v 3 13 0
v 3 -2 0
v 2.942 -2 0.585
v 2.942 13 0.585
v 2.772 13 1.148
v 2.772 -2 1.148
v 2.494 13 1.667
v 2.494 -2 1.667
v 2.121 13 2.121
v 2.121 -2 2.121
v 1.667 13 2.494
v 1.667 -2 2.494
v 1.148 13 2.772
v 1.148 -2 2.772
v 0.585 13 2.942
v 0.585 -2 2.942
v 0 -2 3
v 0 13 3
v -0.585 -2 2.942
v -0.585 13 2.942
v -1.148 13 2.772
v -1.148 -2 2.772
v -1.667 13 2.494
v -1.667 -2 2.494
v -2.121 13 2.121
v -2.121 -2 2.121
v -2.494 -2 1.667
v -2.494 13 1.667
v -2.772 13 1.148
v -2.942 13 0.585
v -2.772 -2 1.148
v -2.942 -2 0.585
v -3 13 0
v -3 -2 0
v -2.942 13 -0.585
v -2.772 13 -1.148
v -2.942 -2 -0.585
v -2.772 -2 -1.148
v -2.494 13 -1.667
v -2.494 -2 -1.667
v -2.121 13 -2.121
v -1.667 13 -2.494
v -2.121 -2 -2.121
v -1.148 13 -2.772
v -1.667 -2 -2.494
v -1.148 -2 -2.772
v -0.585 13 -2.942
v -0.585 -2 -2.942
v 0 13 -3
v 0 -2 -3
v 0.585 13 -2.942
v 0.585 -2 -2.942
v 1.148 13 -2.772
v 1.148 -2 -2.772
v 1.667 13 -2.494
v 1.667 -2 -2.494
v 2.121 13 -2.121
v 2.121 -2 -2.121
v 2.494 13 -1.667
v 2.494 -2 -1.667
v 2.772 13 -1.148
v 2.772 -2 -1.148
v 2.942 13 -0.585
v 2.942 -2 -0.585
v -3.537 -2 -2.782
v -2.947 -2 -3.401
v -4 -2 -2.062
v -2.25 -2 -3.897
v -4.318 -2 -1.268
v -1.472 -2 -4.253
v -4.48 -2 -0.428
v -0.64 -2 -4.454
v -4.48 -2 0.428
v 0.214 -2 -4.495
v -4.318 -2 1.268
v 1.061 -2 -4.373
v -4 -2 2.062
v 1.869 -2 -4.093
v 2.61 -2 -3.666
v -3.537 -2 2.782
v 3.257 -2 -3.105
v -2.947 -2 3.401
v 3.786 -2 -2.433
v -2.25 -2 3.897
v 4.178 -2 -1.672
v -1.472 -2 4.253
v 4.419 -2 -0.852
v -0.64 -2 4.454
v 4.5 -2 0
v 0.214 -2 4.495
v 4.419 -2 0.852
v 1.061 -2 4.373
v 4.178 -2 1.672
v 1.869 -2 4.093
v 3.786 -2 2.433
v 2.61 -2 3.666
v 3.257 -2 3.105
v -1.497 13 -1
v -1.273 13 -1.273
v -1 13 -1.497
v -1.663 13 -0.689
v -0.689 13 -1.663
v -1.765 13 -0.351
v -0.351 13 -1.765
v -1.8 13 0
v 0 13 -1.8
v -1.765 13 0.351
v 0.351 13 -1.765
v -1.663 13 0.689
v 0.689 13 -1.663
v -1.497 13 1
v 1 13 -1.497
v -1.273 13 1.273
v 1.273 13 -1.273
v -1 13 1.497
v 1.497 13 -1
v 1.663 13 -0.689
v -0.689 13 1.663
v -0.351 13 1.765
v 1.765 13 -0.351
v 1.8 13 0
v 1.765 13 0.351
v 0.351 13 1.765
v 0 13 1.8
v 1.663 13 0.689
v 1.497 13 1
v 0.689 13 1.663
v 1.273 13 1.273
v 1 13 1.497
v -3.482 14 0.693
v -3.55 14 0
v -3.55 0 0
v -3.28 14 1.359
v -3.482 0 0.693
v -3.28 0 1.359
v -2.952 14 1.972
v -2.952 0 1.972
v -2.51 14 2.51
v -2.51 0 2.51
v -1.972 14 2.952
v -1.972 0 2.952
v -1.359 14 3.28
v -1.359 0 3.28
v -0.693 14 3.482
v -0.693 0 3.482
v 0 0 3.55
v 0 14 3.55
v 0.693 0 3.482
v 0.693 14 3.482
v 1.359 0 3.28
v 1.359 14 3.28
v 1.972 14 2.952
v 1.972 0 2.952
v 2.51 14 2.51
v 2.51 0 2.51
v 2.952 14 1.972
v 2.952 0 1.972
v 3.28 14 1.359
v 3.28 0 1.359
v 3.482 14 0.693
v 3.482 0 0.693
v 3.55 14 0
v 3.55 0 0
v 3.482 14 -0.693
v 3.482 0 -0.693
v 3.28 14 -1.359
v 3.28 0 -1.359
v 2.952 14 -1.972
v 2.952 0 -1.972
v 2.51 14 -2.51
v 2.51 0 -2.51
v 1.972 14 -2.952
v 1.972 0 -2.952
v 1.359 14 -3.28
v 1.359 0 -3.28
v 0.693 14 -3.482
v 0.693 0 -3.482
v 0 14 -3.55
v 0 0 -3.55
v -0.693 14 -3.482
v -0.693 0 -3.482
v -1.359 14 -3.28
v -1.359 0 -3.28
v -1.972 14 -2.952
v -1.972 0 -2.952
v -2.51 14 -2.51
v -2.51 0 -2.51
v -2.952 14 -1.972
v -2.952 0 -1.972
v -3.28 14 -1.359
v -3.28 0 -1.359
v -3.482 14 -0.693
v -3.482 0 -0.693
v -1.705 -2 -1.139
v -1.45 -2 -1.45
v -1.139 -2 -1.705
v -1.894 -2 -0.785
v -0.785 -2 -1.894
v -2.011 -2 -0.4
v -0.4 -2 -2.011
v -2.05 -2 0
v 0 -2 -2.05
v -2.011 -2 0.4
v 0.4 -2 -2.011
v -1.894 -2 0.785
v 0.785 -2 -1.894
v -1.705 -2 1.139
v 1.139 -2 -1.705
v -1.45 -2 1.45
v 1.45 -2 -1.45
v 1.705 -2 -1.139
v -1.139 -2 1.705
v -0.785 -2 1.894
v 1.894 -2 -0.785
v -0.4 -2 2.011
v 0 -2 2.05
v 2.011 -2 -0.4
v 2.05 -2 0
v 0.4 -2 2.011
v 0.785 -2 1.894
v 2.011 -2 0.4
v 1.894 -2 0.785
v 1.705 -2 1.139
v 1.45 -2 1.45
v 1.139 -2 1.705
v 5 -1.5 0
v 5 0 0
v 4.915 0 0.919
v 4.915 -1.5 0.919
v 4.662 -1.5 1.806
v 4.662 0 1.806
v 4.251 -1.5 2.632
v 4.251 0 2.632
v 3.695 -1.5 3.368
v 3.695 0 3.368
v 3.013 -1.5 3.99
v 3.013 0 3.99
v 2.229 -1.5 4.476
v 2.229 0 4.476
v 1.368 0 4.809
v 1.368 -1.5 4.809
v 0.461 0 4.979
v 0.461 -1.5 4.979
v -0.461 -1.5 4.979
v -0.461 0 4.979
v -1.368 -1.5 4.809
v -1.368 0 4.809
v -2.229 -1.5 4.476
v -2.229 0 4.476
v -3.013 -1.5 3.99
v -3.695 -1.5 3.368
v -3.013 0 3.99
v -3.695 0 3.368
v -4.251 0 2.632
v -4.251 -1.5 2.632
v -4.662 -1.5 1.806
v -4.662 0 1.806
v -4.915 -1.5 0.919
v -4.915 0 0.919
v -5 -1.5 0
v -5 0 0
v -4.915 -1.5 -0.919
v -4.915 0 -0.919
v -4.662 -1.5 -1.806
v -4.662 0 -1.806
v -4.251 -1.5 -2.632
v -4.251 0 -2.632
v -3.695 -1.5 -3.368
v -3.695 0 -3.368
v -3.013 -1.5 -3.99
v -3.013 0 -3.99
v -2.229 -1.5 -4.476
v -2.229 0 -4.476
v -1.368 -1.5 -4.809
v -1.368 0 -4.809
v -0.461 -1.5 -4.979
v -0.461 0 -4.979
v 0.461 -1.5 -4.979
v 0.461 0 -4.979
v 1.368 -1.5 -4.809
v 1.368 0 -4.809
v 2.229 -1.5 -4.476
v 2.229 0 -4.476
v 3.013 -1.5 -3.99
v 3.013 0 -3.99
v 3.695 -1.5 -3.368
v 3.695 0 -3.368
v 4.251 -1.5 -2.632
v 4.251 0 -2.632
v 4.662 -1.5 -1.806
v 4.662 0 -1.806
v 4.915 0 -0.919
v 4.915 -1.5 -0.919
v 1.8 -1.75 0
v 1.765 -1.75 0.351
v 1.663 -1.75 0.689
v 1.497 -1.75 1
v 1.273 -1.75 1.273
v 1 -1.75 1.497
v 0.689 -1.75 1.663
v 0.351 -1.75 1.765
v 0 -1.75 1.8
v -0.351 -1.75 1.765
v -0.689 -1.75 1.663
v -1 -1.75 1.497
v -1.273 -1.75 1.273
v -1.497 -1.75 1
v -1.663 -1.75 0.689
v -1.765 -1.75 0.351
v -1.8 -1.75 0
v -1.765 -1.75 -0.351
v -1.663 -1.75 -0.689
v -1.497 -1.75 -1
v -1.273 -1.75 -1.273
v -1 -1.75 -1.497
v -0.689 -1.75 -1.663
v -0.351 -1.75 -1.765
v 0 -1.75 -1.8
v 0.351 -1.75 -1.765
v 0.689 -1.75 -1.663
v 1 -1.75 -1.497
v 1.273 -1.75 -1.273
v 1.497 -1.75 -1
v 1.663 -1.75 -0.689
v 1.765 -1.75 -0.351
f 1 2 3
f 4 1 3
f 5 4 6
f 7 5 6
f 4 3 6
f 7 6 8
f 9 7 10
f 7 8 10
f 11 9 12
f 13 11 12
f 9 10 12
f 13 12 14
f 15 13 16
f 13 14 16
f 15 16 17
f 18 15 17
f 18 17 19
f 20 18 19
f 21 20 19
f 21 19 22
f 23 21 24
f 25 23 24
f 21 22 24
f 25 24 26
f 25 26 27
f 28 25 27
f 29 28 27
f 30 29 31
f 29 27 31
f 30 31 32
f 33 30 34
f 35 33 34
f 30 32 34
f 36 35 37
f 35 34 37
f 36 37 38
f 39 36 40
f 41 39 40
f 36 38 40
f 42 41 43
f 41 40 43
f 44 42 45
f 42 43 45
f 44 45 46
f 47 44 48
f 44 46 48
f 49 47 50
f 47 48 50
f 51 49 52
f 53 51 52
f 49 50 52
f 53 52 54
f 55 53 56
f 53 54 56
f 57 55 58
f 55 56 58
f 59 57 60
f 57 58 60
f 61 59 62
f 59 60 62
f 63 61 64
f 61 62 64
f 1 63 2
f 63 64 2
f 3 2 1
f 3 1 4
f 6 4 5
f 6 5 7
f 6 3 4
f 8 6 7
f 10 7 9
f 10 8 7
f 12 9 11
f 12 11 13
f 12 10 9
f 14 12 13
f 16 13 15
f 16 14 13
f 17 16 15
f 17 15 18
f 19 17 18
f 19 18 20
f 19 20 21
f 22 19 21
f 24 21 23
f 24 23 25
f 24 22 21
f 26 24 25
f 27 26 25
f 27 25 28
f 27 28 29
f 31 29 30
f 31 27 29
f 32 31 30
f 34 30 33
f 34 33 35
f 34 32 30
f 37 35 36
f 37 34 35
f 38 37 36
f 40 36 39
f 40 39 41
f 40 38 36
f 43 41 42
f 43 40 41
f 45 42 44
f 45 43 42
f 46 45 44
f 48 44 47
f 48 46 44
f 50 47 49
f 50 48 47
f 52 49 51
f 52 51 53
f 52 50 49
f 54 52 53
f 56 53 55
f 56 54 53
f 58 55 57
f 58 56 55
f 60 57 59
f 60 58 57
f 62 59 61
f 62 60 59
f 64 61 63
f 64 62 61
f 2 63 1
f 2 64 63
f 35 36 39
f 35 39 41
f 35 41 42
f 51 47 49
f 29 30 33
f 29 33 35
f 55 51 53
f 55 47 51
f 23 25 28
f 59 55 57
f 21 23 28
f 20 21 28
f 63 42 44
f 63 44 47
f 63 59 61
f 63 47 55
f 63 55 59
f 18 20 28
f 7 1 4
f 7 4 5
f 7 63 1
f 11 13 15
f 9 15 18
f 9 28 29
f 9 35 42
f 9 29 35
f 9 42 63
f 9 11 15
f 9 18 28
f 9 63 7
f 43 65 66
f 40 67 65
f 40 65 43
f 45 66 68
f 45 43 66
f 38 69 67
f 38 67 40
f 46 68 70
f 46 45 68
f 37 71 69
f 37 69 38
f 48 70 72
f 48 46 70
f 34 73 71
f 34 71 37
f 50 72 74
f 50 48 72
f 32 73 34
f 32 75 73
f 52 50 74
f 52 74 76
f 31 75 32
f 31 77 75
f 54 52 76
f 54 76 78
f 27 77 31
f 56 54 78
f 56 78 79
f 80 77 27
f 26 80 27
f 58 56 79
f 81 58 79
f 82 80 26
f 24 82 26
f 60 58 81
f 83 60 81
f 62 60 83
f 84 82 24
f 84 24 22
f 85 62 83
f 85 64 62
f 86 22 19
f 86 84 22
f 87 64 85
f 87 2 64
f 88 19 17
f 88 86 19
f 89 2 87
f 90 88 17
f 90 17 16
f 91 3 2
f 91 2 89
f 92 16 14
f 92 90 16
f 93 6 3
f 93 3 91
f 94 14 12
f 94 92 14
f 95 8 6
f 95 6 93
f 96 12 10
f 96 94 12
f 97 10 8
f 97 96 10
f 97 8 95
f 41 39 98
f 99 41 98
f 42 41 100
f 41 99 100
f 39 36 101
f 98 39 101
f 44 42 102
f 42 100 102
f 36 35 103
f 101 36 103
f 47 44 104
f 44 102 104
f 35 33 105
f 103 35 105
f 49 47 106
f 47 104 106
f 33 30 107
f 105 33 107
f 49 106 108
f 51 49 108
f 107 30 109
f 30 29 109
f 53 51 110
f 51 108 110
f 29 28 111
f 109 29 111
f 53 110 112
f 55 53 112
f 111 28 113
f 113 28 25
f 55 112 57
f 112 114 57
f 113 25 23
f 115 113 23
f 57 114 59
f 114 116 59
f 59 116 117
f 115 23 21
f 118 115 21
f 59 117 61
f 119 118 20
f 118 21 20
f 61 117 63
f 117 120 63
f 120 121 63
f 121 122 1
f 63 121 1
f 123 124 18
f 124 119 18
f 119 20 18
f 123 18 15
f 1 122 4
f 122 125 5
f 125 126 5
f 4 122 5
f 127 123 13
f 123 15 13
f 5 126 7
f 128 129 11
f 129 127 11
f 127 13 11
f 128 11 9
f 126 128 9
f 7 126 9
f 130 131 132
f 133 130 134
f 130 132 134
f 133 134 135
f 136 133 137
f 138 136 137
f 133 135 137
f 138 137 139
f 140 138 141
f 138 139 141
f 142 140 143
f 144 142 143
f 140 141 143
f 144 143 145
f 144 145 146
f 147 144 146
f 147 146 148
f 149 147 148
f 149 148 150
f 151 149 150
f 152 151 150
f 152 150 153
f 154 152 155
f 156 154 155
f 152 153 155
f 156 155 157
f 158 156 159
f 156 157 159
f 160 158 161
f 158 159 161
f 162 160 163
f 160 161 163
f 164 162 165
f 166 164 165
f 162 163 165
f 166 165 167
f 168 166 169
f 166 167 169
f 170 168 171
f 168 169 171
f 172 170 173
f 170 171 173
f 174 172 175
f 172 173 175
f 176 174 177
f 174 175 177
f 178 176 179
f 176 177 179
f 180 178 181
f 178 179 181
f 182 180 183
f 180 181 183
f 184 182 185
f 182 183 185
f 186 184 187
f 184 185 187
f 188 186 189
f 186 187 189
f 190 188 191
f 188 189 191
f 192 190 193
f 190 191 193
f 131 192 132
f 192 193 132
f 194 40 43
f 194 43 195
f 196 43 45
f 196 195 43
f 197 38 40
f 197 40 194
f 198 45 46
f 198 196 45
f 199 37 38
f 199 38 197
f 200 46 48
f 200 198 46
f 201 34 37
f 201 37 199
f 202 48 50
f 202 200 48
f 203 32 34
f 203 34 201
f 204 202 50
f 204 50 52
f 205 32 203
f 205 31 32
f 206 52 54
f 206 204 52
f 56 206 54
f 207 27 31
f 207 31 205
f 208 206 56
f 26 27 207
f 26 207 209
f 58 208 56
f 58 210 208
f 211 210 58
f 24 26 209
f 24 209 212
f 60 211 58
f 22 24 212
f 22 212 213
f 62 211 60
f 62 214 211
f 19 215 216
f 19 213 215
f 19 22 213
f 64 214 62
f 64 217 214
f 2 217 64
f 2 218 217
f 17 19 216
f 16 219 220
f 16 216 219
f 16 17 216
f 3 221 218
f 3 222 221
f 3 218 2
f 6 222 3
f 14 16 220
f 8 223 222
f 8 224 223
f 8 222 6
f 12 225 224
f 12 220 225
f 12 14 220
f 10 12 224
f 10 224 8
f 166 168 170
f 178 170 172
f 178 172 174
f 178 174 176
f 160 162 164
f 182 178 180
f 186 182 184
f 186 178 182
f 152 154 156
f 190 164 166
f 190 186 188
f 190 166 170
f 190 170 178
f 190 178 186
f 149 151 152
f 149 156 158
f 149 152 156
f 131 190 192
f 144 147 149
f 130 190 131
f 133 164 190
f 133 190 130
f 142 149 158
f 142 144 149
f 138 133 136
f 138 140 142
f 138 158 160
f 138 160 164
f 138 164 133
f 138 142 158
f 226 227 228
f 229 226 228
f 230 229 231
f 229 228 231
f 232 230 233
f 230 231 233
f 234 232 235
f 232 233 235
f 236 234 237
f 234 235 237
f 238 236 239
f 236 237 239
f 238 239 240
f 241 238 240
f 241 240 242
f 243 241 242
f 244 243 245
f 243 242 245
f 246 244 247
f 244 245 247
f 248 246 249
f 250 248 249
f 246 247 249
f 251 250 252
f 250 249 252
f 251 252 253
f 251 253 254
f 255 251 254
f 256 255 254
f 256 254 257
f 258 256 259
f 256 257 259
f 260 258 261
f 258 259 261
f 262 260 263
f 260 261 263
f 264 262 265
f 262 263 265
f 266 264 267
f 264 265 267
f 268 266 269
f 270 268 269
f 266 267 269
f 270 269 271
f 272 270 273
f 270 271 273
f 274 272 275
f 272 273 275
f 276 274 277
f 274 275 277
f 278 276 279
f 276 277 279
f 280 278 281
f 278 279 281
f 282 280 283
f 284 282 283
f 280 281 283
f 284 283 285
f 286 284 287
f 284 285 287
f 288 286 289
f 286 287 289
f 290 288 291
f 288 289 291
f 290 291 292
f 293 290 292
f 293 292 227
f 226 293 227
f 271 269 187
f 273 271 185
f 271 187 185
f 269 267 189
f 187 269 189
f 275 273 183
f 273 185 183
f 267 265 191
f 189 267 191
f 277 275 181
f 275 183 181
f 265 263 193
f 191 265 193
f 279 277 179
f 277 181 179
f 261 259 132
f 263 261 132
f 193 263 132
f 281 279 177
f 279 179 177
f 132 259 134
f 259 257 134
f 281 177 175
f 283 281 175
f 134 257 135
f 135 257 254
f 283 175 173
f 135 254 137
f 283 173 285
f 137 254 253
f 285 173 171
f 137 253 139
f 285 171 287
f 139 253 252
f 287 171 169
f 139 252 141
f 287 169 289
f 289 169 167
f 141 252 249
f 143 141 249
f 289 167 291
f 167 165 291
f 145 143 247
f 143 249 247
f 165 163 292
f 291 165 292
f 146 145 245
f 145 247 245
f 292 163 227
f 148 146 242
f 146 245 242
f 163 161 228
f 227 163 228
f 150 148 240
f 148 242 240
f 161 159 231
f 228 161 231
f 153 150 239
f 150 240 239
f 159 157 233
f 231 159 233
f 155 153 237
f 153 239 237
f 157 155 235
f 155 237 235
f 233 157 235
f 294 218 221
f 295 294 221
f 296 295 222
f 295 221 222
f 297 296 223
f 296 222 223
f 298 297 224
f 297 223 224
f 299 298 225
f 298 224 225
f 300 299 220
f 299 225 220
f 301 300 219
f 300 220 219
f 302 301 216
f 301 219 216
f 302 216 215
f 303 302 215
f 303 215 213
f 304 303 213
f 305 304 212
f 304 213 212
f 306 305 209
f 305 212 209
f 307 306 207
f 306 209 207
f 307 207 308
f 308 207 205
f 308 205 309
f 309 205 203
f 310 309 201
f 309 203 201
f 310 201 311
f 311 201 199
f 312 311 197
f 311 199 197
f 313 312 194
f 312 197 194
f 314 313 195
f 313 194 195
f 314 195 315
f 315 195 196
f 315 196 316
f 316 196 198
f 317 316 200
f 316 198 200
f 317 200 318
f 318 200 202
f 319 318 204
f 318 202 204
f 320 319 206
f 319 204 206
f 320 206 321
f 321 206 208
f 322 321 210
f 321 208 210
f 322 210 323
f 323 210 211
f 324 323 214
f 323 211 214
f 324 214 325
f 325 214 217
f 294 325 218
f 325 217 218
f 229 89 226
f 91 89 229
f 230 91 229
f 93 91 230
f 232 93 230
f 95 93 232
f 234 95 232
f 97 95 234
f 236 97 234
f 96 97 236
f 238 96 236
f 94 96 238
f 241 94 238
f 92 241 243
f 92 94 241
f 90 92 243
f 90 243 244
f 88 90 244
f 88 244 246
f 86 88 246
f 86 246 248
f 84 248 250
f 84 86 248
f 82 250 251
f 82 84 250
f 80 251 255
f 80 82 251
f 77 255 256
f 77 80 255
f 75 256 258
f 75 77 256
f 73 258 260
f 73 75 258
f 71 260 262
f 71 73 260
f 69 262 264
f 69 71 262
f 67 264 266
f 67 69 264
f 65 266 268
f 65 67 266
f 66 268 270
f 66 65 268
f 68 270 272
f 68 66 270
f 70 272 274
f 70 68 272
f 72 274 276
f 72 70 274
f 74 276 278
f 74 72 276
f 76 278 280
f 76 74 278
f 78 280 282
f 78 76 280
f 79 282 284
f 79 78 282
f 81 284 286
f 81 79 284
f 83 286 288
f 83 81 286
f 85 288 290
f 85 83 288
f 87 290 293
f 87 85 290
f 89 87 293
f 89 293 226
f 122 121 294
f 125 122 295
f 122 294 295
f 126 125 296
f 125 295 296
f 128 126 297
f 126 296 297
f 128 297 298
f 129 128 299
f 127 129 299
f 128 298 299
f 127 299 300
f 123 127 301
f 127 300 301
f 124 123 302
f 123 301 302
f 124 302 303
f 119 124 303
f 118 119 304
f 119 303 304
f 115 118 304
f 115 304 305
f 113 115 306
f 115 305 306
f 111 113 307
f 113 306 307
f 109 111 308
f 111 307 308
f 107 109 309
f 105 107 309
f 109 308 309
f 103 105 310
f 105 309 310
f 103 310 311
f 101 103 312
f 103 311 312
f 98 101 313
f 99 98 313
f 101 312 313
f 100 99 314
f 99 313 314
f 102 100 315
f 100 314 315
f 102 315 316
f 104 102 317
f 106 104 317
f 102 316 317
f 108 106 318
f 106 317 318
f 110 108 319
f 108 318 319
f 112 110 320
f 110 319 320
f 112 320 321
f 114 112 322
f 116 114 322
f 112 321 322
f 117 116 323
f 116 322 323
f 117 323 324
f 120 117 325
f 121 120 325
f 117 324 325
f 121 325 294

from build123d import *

# Parameters (mm, degrees)
F0_R     = 5
F1_DEPTH = 2
F2_R     = 3.55
F3_DEPTH = 14
F4_R     = 3
F5_DEPTH = 15
F6_R     = 3
F6_R_2   = 1.8
F7_DEPTH = 15
F8_SIZE  = 0.25
F9_SIZE  = 0.5


with BuildPart() as f1:
    # F0 (on Front) → F1 (new body)
    with BuildSketch(Plane.XZ):
        Circle(F0_R)
    extrude(amount=F1_DEPTH)

    # F2 (on face) → F3 (join)
    with BuildSketch(Plane(origin=(0, 0, 0), x_dir=(-1, 0, 0), z_dir=(0, 1, 0))):
        Circle(F2_R)
    extrude(amount=F3_DEPTH)

    # F4 (on face) → F5 (cut, through all)
    with BuildSketch(Plane.XZ.offset(2)):
        Circle(F4_R)
    extrude(amount=-F5_DEPTH, mode=Mode.SUBTRACT)

    # F9
    f9_edges = [f1.edges().sort_by_distance(p)[0] for p in [
        (-5, -2, 0),
    ]]
    chamfer(f9_edges, length=F9_SIZE)


with BuildPart() as f7:
    # F6 (on face) → F7 (new body, through all)
    with BuildSketch(Plane.XZ.offset(2)):
        Circle(F6_R)
        Circle(F6_R_2, mode=Mode.SUBTRACT)
    extrude(amount=-F7_DEPTH)

    # F8
    f8_edges = [f7.edges().sort_by_distance(p)[0] for p in [
        (-1.8, -2, 0),
    ]]
    chamfer(f8_edges, length=F8_SIZE)


solid = Compound([f1.part, f7.part])
